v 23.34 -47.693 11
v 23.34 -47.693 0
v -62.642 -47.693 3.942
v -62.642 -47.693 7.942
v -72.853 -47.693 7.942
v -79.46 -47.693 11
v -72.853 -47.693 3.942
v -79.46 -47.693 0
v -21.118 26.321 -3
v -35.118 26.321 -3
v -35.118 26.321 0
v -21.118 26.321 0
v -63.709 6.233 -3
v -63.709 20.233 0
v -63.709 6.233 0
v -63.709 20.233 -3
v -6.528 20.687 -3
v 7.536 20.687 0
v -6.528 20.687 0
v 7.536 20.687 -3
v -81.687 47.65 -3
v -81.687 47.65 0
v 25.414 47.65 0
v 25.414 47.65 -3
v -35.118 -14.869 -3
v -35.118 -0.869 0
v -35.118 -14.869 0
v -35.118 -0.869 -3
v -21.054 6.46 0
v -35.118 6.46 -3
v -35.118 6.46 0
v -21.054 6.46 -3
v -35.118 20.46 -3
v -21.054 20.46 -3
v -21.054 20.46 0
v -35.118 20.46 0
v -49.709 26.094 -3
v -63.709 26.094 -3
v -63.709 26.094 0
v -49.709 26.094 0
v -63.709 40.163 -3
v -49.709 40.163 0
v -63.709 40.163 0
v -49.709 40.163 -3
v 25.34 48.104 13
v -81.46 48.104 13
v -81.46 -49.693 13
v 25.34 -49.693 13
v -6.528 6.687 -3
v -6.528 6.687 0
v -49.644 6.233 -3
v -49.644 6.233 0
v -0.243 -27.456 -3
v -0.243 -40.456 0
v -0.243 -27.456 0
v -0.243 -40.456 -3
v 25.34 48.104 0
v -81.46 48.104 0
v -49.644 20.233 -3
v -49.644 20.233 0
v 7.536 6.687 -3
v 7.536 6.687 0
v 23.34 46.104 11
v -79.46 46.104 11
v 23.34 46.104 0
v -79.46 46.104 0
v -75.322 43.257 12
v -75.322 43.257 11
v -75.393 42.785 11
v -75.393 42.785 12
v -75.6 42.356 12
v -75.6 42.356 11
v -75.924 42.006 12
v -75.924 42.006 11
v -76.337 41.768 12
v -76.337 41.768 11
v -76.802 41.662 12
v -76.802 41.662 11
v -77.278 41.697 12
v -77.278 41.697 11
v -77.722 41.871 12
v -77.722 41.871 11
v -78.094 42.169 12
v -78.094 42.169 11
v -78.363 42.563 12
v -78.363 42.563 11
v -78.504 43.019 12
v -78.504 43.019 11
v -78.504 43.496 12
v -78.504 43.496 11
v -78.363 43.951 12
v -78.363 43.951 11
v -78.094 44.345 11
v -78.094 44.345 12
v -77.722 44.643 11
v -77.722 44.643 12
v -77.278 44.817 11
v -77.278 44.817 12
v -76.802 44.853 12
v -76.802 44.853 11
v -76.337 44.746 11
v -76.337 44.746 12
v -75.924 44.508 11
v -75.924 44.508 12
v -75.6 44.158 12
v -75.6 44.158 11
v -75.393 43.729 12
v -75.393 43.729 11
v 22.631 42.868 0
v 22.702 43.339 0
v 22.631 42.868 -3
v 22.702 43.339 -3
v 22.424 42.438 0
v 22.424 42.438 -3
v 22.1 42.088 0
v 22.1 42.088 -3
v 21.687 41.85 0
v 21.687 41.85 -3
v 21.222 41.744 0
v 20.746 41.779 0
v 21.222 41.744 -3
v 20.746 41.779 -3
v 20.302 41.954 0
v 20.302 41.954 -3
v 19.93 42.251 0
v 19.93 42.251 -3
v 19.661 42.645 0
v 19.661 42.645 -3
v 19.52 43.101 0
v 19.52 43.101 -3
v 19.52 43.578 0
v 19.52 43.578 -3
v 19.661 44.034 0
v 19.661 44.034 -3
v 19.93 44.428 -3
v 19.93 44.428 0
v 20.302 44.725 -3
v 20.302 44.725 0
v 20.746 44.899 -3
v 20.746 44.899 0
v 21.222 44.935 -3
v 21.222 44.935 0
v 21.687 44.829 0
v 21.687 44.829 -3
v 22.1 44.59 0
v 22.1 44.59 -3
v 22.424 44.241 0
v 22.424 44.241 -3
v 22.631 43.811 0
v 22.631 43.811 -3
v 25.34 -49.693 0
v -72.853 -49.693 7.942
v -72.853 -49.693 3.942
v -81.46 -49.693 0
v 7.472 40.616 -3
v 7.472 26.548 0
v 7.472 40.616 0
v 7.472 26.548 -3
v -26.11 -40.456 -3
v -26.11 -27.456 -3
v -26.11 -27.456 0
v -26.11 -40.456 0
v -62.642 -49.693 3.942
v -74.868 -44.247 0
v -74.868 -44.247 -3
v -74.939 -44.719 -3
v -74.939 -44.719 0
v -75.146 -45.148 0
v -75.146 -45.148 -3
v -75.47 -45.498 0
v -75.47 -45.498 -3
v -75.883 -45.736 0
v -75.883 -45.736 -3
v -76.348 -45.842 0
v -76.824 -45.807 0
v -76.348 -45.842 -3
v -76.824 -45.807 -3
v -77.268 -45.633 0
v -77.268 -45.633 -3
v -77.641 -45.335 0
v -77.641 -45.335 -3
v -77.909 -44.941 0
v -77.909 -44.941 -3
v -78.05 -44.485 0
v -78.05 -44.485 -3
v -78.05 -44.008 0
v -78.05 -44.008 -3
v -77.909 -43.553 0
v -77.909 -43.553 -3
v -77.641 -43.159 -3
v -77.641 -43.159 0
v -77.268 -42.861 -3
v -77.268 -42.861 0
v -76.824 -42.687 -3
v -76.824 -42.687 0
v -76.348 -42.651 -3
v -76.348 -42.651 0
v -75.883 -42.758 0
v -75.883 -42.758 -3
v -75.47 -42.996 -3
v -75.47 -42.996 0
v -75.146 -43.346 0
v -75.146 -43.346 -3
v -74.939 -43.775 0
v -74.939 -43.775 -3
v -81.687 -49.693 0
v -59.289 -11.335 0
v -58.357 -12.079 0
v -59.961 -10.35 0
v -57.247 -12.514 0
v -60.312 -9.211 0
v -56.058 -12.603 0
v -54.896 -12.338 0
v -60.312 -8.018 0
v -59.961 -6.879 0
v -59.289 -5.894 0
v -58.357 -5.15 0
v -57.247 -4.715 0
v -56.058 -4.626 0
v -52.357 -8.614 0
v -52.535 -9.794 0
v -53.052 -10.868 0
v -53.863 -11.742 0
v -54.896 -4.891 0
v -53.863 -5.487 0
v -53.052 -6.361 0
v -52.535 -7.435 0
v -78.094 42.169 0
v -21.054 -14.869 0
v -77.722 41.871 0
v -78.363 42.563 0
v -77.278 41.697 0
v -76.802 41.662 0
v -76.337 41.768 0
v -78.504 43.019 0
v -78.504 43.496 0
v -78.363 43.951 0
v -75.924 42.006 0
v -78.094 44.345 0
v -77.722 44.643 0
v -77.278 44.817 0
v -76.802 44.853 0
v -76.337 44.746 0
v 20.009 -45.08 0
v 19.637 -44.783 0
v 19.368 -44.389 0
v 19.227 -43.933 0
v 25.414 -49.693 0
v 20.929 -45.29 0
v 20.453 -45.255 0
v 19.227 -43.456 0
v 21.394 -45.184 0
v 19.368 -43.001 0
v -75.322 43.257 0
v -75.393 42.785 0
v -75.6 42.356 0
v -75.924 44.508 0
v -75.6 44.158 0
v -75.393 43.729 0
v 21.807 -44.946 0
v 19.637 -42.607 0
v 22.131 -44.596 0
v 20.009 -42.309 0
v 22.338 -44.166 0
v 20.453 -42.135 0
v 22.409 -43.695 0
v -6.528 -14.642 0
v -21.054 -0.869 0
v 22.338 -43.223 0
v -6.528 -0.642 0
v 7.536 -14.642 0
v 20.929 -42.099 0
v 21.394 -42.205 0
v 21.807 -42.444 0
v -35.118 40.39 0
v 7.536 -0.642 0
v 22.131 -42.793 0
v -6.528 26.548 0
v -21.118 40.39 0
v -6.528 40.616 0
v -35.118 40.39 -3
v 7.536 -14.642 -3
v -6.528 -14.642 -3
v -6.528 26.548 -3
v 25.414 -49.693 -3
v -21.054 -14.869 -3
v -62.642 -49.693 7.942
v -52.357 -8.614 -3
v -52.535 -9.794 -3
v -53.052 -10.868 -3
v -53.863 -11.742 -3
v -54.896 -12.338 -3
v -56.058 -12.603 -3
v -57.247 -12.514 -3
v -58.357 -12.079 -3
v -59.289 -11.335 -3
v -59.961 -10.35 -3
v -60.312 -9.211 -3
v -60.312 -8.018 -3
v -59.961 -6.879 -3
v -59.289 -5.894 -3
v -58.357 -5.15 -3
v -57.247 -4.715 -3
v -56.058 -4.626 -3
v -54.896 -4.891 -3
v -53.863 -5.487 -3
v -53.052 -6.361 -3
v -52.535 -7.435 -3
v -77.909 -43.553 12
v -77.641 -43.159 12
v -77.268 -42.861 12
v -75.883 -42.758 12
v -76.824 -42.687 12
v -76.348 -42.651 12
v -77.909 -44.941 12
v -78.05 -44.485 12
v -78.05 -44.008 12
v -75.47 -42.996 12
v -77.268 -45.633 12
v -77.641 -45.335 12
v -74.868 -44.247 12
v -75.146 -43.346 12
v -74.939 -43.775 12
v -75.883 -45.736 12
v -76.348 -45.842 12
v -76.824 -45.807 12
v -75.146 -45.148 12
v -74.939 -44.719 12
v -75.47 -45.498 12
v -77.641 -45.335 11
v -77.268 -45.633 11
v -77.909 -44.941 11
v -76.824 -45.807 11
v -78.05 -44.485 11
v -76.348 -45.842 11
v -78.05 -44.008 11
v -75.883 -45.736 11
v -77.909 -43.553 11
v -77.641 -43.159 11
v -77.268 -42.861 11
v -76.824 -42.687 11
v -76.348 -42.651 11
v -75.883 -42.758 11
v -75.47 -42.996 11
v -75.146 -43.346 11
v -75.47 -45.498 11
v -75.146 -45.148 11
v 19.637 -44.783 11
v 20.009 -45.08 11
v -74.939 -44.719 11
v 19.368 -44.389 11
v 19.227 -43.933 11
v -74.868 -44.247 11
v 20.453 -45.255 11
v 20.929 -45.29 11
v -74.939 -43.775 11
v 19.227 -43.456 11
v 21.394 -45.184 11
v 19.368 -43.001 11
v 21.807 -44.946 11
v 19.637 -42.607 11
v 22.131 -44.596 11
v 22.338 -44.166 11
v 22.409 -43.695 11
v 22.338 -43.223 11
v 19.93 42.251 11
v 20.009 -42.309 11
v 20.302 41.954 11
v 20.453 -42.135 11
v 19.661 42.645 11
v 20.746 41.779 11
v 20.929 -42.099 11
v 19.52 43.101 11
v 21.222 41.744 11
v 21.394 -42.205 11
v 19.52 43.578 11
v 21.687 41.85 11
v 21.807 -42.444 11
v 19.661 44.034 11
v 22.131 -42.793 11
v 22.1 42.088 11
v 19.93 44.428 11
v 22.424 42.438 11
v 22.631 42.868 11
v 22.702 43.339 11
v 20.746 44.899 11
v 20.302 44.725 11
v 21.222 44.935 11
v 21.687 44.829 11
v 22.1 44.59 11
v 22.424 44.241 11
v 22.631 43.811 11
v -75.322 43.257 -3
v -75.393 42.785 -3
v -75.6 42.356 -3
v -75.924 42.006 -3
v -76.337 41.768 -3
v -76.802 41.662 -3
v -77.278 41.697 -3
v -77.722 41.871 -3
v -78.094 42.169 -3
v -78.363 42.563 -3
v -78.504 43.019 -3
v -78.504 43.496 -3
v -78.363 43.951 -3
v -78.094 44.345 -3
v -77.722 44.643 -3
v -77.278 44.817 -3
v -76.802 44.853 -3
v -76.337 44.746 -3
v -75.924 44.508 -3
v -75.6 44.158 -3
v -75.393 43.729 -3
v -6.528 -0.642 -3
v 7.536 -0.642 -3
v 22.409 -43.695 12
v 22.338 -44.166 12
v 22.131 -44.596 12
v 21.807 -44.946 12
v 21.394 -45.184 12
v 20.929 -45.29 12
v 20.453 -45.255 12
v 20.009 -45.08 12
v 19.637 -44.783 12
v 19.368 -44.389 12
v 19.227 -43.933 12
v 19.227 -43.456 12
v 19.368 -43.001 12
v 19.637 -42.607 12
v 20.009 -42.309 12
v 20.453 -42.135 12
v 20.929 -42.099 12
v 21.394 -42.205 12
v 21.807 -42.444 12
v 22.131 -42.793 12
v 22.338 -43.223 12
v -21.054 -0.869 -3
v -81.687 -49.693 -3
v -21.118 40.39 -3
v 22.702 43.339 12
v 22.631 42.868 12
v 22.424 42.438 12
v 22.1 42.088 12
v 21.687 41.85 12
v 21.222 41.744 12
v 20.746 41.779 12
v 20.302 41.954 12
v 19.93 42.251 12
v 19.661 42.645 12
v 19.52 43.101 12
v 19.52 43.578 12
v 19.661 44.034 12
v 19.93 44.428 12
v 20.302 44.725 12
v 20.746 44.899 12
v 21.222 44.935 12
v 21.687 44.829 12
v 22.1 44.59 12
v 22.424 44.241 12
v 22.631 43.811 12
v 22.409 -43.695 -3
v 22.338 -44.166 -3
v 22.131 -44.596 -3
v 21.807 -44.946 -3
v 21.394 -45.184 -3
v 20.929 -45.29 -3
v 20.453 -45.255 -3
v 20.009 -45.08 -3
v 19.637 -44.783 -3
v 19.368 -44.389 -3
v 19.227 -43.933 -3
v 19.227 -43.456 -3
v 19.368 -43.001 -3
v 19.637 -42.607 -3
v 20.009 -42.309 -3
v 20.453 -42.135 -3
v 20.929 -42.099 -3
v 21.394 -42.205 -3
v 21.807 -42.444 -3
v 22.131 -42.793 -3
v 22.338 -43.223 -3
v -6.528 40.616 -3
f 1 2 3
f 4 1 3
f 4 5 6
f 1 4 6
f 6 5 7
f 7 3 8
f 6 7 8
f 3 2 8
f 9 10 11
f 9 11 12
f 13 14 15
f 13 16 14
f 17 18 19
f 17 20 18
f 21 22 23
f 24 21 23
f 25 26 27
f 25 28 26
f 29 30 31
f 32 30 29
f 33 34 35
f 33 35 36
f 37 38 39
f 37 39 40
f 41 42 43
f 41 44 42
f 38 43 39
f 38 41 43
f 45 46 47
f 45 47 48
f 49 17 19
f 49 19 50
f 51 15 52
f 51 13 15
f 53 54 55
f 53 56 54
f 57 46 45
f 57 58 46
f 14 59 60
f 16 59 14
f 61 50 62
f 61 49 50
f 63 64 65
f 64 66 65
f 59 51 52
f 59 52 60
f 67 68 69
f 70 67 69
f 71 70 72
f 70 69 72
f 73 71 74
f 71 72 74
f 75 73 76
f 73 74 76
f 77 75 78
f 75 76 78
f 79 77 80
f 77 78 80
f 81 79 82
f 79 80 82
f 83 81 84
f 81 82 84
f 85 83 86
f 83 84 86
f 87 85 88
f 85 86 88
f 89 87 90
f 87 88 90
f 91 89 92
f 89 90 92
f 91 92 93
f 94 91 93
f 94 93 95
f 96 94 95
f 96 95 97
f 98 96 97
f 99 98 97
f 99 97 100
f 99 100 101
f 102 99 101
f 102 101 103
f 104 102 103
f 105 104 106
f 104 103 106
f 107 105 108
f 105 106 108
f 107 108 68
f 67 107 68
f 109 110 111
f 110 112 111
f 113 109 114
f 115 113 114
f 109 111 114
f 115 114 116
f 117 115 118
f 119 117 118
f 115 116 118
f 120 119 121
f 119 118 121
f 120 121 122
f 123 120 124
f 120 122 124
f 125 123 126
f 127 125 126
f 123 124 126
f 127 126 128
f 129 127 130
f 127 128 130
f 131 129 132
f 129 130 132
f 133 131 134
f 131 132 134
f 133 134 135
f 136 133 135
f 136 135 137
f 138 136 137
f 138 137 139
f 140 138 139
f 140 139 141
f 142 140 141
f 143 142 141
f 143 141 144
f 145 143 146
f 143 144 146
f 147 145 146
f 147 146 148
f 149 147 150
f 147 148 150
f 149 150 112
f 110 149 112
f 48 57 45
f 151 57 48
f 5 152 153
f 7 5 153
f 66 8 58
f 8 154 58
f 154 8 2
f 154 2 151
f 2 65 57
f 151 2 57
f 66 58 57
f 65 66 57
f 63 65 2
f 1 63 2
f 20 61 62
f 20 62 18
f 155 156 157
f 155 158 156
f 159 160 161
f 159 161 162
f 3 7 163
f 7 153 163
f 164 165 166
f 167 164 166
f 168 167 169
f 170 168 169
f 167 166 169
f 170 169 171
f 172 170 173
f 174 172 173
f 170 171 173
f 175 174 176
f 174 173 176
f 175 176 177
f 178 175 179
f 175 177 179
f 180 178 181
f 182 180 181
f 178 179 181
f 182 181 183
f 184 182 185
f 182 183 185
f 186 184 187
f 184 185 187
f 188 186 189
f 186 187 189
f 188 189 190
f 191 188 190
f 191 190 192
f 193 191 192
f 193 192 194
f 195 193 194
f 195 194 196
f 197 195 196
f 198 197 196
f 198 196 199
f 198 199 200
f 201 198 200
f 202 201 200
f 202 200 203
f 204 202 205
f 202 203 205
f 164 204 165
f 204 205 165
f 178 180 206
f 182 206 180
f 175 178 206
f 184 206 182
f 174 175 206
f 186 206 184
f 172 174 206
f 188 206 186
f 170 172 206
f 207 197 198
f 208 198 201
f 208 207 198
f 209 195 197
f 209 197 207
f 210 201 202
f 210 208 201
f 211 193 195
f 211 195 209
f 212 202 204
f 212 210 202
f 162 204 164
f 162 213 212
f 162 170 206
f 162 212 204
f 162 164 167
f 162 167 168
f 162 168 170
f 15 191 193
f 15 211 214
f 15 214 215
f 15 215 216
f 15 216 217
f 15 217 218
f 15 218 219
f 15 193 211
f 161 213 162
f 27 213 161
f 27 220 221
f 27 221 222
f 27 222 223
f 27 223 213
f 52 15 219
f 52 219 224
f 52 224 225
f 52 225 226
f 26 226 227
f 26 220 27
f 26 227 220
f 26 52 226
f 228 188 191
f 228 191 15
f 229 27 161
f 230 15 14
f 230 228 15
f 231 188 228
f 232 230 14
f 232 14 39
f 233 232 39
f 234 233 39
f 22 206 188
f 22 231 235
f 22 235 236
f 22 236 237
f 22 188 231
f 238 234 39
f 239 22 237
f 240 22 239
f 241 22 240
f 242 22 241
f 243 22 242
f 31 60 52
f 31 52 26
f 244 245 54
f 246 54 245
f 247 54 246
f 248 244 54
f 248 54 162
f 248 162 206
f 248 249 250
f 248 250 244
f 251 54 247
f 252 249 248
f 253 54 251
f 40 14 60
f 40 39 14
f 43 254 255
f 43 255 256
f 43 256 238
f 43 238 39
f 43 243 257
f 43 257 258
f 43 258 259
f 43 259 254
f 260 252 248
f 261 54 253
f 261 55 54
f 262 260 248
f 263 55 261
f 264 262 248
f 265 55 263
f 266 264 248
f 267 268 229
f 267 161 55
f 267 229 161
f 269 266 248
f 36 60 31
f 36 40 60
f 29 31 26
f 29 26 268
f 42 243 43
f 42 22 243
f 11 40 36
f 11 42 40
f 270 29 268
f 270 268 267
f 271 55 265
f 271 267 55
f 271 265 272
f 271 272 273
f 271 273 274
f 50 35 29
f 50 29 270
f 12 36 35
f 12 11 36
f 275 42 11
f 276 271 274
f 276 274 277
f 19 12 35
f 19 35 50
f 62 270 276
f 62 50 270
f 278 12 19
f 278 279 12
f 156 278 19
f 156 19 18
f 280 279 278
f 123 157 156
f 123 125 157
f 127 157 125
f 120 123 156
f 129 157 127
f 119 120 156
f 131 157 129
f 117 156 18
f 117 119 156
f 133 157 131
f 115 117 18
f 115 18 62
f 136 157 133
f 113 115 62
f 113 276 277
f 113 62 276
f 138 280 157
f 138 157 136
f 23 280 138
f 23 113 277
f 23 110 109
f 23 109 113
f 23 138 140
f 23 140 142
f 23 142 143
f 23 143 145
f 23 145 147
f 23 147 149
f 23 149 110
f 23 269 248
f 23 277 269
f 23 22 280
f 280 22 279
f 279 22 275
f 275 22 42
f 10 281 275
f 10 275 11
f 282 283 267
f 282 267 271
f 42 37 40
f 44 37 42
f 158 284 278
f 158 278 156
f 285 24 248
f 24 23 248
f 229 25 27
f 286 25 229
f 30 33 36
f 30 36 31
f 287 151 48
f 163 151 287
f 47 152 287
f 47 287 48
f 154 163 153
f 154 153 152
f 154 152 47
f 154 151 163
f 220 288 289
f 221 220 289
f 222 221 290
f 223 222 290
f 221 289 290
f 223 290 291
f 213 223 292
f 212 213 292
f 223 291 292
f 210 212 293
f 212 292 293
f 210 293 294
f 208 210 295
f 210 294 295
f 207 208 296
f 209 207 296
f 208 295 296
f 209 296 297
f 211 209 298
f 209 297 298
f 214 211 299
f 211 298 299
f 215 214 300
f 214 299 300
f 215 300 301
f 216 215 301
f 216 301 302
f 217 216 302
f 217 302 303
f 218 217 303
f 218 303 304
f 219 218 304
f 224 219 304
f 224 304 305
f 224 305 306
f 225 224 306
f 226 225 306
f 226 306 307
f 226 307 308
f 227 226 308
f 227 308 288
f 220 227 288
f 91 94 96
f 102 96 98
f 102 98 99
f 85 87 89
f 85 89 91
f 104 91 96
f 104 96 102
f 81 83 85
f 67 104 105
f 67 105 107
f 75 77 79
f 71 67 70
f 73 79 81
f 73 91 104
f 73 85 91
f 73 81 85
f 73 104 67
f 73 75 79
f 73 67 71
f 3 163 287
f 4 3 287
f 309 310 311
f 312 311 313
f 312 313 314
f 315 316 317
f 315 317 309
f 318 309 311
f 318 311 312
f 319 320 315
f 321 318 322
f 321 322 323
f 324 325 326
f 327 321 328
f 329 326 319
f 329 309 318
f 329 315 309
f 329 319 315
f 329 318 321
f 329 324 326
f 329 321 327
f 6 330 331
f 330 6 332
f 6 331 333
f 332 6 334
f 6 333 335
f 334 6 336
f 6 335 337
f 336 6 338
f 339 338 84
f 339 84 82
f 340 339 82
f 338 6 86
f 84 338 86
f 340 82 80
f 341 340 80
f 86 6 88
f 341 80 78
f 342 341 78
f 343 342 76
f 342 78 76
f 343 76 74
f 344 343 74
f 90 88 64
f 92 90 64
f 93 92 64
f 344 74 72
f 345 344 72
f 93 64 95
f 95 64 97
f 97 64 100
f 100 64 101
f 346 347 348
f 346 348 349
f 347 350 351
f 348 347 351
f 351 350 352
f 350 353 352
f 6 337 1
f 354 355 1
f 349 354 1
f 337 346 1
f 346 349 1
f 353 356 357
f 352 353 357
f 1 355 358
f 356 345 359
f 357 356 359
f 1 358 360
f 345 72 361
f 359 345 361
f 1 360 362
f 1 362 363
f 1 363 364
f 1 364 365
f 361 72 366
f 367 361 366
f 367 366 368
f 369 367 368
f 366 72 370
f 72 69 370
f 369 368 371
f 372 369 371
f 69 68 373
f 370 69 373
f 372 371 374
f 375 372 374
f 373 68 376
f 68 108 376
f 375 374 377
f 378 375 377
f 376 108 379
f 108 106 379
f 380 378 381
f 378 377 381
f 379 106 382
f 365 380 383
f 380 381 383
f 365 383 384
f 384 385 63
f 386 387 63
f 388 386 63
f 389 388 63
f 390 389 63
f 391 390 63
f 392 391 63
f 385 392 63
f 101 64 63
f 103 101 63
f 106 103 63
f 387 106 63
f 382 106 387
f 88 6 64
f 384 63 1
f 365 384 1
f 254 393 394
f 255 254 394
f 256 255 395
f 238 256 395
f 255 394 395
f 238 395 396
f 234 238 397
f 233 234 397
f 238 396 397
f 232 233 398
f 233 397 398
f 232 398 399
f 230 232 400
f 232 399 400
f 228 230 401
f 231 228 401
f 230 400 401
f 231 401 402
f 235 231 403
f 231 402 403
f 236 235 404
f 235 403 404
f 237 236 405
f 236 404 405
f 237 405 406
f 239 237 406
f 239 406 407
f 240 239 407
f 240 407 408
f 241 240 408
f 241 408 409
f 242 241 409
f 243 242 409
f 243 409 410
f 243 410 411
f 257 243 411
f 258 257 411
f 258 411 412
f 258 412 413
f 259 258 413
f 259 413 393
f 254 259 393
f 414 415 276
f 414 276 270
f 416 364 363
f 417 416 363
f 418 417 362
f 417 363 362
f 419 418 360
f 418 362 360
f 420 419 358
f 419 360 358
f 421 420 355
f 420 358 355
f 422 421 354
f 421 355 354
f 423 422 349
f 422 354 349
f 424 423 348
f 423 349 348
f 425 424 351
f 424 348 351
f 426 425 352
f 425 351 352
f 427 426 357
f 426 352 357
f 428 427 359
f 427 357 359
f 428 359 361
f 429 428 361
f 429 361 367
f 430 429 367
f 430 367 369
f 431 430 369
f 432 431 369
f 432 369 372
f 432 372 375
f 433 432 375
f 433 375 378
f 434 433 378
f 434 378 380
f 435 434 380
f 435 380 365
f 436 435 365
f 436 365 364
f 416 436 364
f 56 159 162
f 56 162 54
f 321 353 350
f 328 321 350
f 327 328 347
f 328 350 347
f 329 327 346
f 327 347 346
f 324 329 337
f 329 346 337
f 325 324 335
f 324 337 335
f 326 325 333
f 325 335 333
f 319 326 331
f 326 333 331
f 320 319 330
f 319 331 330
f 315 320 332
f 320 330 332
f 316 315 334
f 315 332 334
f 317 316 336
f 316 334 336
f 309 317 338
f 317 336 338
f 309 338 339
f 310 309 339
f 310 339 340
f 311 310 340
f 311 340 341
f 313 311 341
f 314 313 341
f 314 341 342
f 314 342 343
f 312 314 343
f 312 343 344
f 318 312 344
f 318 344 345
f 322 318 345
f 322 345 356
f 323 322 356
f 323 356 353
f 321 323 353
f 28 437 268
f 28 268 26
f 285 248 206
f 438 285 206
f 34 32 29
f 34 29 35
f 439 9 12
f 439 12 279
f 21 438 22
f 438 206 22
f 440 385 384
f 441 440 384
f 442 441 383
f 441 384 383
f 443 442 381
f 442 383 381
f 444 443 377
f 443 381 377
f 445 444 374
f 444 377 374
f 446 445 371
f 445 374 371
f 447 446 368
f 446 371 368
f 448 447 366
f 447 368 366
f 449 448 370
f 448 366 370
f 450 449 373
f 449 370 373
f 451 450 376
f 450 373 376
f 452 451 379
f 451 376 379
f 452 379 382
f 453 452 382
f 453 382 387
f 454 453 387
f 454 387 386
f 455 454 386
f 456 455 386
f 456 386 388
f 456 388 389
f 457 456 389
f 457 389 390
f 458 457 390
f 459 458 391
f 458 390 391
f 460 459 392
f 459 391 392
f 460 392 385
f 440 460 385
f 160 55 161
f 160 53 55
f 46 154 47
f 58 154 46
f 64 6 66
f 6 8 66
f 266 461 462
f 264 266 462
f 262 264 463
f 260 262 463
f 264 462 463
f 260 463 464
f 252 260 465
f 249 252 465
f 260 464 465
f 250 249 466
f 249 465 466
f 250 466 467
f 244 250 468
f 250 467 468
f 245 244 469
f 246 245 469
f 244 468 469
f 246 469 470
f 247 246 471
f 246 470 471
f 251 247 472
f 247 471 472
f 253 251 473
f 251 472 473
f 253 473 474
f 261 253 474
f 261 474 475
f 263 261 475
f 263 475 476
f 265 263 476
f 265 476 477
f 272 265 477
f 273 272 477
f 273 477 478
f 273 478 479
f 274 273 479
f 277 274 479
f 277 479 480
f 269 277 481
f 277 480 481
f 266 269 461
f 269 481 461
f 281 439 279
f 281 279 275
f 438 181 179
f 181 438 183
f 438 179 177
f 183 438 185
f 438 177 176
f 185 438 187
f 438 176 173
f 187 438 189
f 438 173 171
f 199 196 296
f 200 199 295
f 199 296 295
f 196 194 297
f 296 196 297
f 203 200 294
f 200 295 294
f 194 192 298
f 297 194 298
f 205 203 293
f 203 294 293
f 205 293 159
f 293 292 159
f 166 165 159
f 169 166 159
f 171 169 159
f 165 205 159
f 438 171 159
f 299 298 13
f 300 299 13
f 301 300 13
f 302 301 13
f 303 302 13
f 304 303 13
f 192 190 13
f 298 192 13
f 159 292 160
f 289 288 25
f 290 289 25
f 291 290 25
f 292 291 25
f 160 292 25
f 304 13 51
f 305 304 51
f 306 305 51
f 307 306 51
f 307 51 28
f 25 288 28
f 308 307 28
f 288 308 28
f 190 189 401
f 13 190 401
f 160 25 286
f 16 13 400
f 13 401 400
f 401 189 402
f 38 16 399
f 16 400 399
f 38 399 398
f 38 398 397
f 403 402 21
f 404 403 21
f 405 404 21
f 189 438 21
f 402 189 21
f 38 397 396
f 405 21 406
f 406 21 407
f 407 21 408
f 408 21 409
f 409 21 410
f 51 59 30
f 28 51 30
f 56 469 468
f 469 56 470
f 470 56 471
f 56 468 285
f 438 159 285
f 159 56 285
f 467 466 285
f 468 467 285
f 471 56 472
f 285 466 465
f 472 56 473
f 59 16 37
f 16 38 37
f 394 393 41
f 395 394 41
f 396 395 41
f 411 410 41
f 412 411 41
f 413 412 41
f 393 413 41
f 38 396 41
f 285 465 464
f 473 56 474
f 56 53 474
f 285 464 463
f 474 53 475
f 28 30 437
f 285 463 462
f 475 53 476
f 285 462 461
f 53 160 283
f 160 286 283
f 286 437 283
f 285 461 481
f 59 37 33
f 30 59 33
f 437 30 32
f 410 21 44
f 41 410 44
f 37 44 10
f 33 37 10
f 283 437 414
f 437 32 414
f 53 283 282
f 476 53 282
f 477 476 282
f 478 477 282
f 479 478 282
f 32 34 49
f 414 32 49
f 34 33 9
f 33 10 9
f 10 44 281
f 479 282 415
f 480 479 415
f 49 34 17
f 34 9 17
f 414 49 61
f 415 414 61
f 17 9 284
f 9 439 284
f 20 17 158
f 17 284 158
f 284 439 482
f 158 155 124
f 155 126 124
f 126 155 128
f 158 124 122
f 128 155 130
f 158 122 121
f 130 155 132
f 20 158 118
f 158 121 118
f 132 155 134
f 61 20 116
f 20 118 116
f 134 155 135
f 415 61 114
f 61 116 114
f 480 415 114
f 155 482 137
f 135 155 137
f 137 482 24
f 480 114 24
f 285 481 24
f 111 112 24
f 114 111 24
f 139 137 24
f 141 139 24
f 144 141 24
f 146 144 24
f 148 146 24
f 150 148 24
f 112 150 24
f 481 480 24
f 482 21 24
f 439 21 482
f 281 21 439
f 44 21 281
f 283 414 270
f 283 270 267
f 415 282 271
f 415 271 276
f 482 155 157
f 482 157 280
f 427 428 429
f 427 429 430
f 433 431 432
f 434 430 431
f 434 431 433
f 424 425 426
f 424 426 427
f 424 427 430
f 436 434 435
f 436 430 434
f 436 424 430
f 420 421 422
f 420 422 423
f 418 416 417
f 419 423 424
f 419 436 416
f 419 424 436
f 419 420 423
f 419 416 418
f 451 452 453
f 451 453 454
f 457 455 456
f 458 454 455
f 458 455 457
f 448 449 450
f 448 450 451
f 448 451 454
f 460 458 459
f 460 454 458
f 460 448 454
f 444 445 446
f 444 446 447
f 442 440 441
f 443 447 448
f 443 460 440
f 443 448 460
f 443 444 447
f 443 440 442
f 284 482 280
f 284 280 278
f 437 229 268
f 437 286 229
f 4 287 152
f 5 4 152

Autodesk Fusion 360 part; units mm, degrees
sketch "Sketch1" plane through (0, 0, 0) normal (0, 0, 1) x (1, 0, 0)
  line L0 (-81.4597, 48.1043) -> (25.3403, 48.1043)
  line L1 (25.3403, 48.1043) -> (25.3403, -49.6927)
  line L2 (25.3403, -49.6927) -> (-81.4597, -49.6927)
  line L3 (-81.4597, -49.6927) -> (-81.4597, 48.1043)
  dimension "d1" = 106.8
extrude "Extrude1" add sketch "Sketch1" along normal blind 13 makes body 1
shell "Shell1" thickness 2 removed faces 1 at (-45.8597, 15.5053, 0) on bodies 1
sketch "Sketch2" plane through (0, 0, 0) normal (0, 0, 1) x (1, 0, 0)
  line L0 (-81.6866, 47.6505) -> (25.4136, 47.6505)
  line L1 (25.4136, 47.6505) -> (25.4136, -49.6927)
  line L2 (25.4136, -49.6927) -> (-81.6866, -49.6927)
  line L3 (-81.6866, -49.6927) -> (-81.6866, 47.6505)
extrude "Extrude2" add sketch "Sketch2" against normal blind 3 separate body makes body 2
sketch "Sketch3" plane through (0, 0, -3) normal (0, 0, -1) x (1, 0, 0)
  line L0 (25.4136, 49.6927) -> (-81.6866, 49.6927)
  line L1 (-81.6866, 49.6927) -> (-81.6866, -47.6505)
  line L2 (-81.6866, -47.6505) -> (25.4136, -47.6505)
  line L3 (25.4136, -47.6505) -> (25.4136, 49.6927)
  line L4 (7.4719, -40.6164) -> (-6.5281, -40.6164)
  line L5 (-6.5281, -40.6164) -> (-6.5281, -26.5481)
  line L6 (-6.5281, -26.5481) -> (7.4719, -26.5481)
  line L7 (7.4719, -26.5481) -> (7.4719, -40.6164)
  line L8 (7.5365, -20.6868) -> (-6.5281, -20.6868)
  line L9 (-6.5281, -20.6868) -> (-6.5281, -6.6868)
  line L10 (-6.5281, -6.6868) -> (7.5365, -6.6868)
  line L11 (7.5365, -6.6868) -> (7.5365, -20.6868)
  line L12 (7.5365, 0.6425) -> (-6.5281, 0.6425)
  line L13 (-6.5281, 0.6425) -> (-6.5281, 14.6425)
  line L14 (-6.5281, 14.6425) -> (7.5365, 14.6425)
  line L15 (7.5365, 14.6425) -> (7.5365, 0.6425)
  line L16 (-21.1185, -40.3895) -> (-35.1185, -40.3895)
  line L17 (-21.0538, 14.8694) -> (-21.0538, 0.8694)
  line L18 (-35.1185, -20.4599) -> (-35.1185, -6.4599)
  line L19 (-21.1185, -26.3212) -> (-21.1185, -40.3895)
  line L20 (-35.1185, 14.8694) -> (-21.0538, 14.8694)
  line L21 (-21.0538, -20.4599) -> (-35.1185, -20.4599)
  line L22 (-21.0538, 0.8694) -> (-35.1185, 0.8694)
  line L23 (-21.0538, -6.4599) -> (-21.0538, -20.4599)
  line L24 (-35.1185, -26.3212) -> (-21.1185, -26.3212)
  line L25 (-35.1185, -6.4599) -> (-21.0538, -6.4599)
  line L26 (-35.1185, 0.8694) -> (-35.1185, 14.8694)
  line L27 (-35.1185, -40.3895) -> (-35.1185, -26.3212)
  line L28 (7.4719, -40.6164) -> (-6.5281, -40.6164)
  line L29 (7.5365, 14.6425) -> (7.5365, 0.6425)
  line L30 (-6.5281, -20.6868) -> (-6.5281, -6.6868)
  line L31 (7.4719, -26.5481) -> (7.4719, -40.6164)
  line L32 (-6.5281, 14.6425) -> (7.5365, 14.6425)
  line L33 (7.5365, -20.6868) -> (-6.5281, -20.6868)
  line L34 (7.5365, 0.6425) -> (-6.5281, 0.6425)
  line L35 (7.5365, -6.6868) -> (7.5365, -20.6868)
  line L36 (-6.5281, -26.5481) -> (7.4719, -26.5481)
  line L37 (-6.5281, -6.6868) -> (7.5365, -6.6868)
  line L38 (-6.5281, 0.6425) -> (-6.5281, 14.6425)
  line L39 (-6.5281, -40.6164) -> (-6.5281, -26.5481)
  line L40 (-49.7088, -40.1626) -> (-63.7088, -40.1626)
  line L41 (-63.7088, -20.233) -> (-63.7088, -6.233)
  line L42 (-49.7088, -26.0943) -> (-49.7088, -40.1626)
  line L43 (-49.6441, -20.233) -> (-63.7088, -20.233)
  line L44 (-49.6441, -6.233) -> (-49.6441, -20.233)
  line L45 (-63.7088, -26.0943) -> (-49.7088, -26.0943)
  line L46 (-63.7088, -6.233) -> (-49.6441, -6.233)
  line L47 (-63.7088, -40.1626) -> (-63.7088, -26.0943)
  dimension "d7" = 14
  dimension "d8" = 14
  dimension "d9" = 14
  dimension "d10" = 14
  dimension "d11" = 14
  dimension "d12" = 14
  dimension "d13" = 14
  dimension "d14" = 14
  dimension "d15" = 14
  dimension "d16" = 14
  dimension "d17" = 14
sketch "Sketch4" plane through (0, 0, -3) normal (0, 0, -1) x (1, 0, 0)
  circle A0 centre (-56.3569, 8.6145) radius 4
  dimension "d19" = 8
extrude "Extrude3" cut sketch "Sketch3" sketch "Sketch4" against normal blind 5 contours L4 L5 L6 L7 L28 L31 L36 L39 | L8 L9 L10 L11 L30 L33 L35 L37 | L12 L13 L14 L15 L29 L32 L34 L38 | L16 L19 L24 L27 | L17 L20 L22 L26 | L18 L21 L23 L25 | L40 L42 L45 L47 | L41 L43 L44 L46 of sketch 2 bodies 2
sketch "Sketch5" plane through (0, 0, -3) normal (0, 0, -1) x (1, 0, 0)
  line L0 (25.4136, 49.6927) -> (-81.6866, 49.6927)
  line L1 (-81.6866, 49.6927) -> (-81.6866, -47.6505)
  line L2 (-81.6866, -47.6505) -> (25.4136, -47.6505)
  line L3 (25.4136, -47.6505) -> (25.4136, 49.6927)
  circle A0 centre (-56.3569, 8.6145) radius 4
  line L4 (7.5365, -20.6868) -> (-6.5281, -20.6868)
  line L5 (-6.5281, -20.6868) -> (-6.5281, -6.6868)
  line L6 (-6.5281, -6.6868) -> (7.5365, -6.6868)
  line L7 (7.5365, -6.6868) -> (7.5365, -20.6868)
  line L8 (-21.1185, -26.3212) -> (-21.1185, -40.3895)
  line L9 (-21.1185, -40.3895) -> (-35.1185, -40.3895)
  line L10 (-35.1185, -40.3895) -> (-35.1185, -26.3212)
  line L11 (-35.1185, -26.3212) -> (-21.1185, -26.3212)
  line L12 (7.5365, 14.6425) -> (7.5365, 0.6425)
  line L13 (7.5365, 0.6425) -> (-6.5281, 0.6425)
  line L14 (-6.5281, 0.6425) -> (-6.5281, 14.6425)
  line L15 (-6.5281, 14.6425) -> (7.5365, 14.6425)
  line L16 (-49.7088, -26.0943) -> (-49.7088, -40.1626)
  line L17 (-49.7088, -40.1626) -> (-63.7088, -40.1626)
  line L18 (-63.7088, -40.1626) -> (-63.7088, -26.0943)
  line L19 (-63.7088, -26.0943) -> (-49.7088, -26.0943)
  line L20 (-21.0538, 14.8694) -> (-21.0538, 0.8694)
  line L21 (-21.0538, 0.8694) -> (-35.1185, 0.8694)
  line L22 (-35.1185, 0.8694) -> (-35.1185, 14.8694)
  line L23 (-35.1185, 14.8694) -> (-21.0538, 14.8694)
  line L24 (-21.0538, -20.4599) -> (-35.1185, -20.4599)
  line L25 (-35.1185, -20.4599) -> (-35.1185, -6.4599)
  line L26 (-35.1185, -6.4599) -> (-21.0538, -6.4599)
  line L27 (-21.0538, -6.4599) -> (-21.0538, -20.4599)
  line L28 (7.4719, -26.5481) -> (7.4719, -40.6164)
  line L29 (7.4719, -40.6164) -> (-6.5281, -40.6164)
  line L30 (-6.5281, -40.6164) -> (-6.5281, -26.5481)
  line L31 (-6.5281, -26.5481) -> (7.4719, -26.5481)
  line L32 (-49.6441, -20.233) -> (-63.7088, -20.233)
  line L33 (-63.7088, -20.233) -> (-63.7088, -6.233)
  line L34 (-63.7088, -6.233) -> (-49.6441, -6.233)
  line L35 (-49.6441, -6.233) -> (-49.6441, -20.233)
  line L36 (-0.243, 27.4558) -> (-26.1104, 27.4558)
  line L37 (-26.1104, 27.4558) -> (-26.1104, 40.4558)
  line L38 (-26.1104, 40.4558) -> (-0.243, 40.4558)
  line L39 (-0.243, 40.4558) -> (-0.243, 27.4558)
  dimension "d22" = 13
extrude "Extrude4" cut sketch "Sketch5" against normal blind 5 contours L36 L37 L38 L39 bodies 2
sketch "Sketch6" plane through (0, 0, -3) normal (0, 0, -1) x (1, 0, 0)
  line L0 (-49.6441, -20.233) -> (-63.7088, -20.233)
  line L1 (-63.7088, -20.233) -> (-63.7088, -6.233)
  line L2 (-63.7088, -6.233) -> (-49.6441, -6.233)
  line L3 (-49.6441, -6.233) -> (-49.6441, -20.233)
  line L4 (7.4719, -26.5481) -> (7.4719, -40.6164)
  line L5 (7.4719, -40.6164) -> (-6.5281, -40.6164)
  line L6 (-6.5281, -40.6164) -> (-6.5281, -26.5481)
  line L7 (-6.5281, -26.5481) -> (7.4719, -26.5481)
  line L8 (-21.0538, -20.4599) -> (-35.1185, -20.4599)
  line L9 (-35.1185, -20.4599) -> (-35.1185, -6.4599)
  line L10 (-35.1185, -6.4599) -> (-21.0538, -6.4599)
  line L11 (-21.0538, -6.4599) -> (-21.0538, -20.4599)
  line L12 (-21.0538, 14.8694) -> (-21.0538, 0.8694)
  line L13 (-21.0538, 0.8694) -> (-35.1185, 0.8694)
  line L14 (-35.1185, 0.8694) -> (-35.1185, 14.8694)
  line L15 (-35.1185, 14.8694) -> (-21.0538, 14.8694)
  line L16 (-49.7088, -26.0943) -> (-49.7088, -40.1626)
  line L17 (-49.7088, -40.1626) -> (-63.7088, -40.1626)
  line L18 (-63.7088, -40.1626) -> (-63.7088, -26.0943)
  line L19 (-63.7088, -26.0943) -> (-49.7088, -26.0943)
  line L20 (7.5365, 14.6425) -> (7.5365, 0.6425)
  line L21 (7.5365, 0.6425) -> (-6.5281, 0.6425)
  line L22 (-6.5281, 0.6425) -> (-6.5281, 14.6425)
  line L23 (-6.5281, 14.6425) -> (7.5365, 14.6425)
  line L24 (-21.1185, -26.3212) -> (-21.1185, -40.3895)
  line L25 (-21.1185, -40.3895) -> (-35.1185, -40.3895)
  line L26 (-35.1185, -40.3895) -> (-35.1185, -26.3212)
  line L27 (-35.1185, -26.3212) -> (-21.1185, -26.3212)
  line L28 (7.5365, -20.6868) -> (-6.5281, -20.6868)
  line L29 (-6.5281, -20.6868) -> (-6.5281, -6.6868)
  line L30 (-6.5281, -6.6868) -> (7.5365, -6.6868)
  line L31 (7.5365, -6.6868) -> (7.5365, -20.6868)
  circle A0 centre (-56.3569, 8.6145) radius 4
  line L32 (25.4136, 49.6927) -> (-81.6866, 49.6927)
  line L33 (-81.6866, 49.6927) -> (-81.6866, -47.6505)
  line L34 (-81.6866, -47.6505) -> (25.4136, -47.6505)
  line L35 (25.4136, -47.6505) -> (25.4136, 49.6927)
  line L36 (-26.1104, 27.4558) -> (-26.1104, 40.4558)
  line L37 (-26.1104, 40.4558) -> (-0.243, 40.4558)
  line L38 (-0.243, 40.4558) -> (-0.243, 27.4558)
  line L39 (-0.243, 27.4558) -> (-26.1104, 27.4558)
sketch "Sketch7" plane through (0, 0, -3) normal (0, 0, -1) x (1, 0, 0)
sketch "Sketch8" plane through (0, 0, -3) normal (0, 0, -1) x (1, 0, 0)
sketch "Sketch9" plane through (0, -49.6927, 0) normal (0, -1, 0) x (1, 0, 0)
  line L0 (-81.4597, 0) -> (25.3403, 0)
  line L1 (25.3403, 0) -> (25.3403, 13)
  line L2 (25.3403, 13) -> (-81.4597, 13)
  line L3 (-81.4597, 13) -> (-81.4597, 0)
  line L4 (-62.6425, 7.9418) -> (-72.8533, 7.9418)
  line L5 (-72.8533, 7.9418) -> (-72.8533, 3.9418)
  line L6 (-72.8533, 3.9418) -> (-62.6425, 3.9418)
  line L7 (-62.6425, 3.9418) -> (-62.6425, 7.9418)
  dimension "d26" = 4
extrude "Extrude5" cut sketch "Sketch9" against normal blind 5 contours L4 L5 L6 L7 bodies 1
sketch "Sketch10" plane through (0, 0, -3) normal (0, 0, -1) x (1, 0, 0)
  circle A0 centre (-76.6946, -42.8855) radius 1.6
  circle A1 centre (-76.6946, 44.1487) radius 1.6
  circle A2 centre (20.5825, -42.8855) radius 1.6
  circle A3 centre (20.8094, 43.6948) radius 1.6
  dimension "d29" = 3.2
  dimension "d30" = 3.2
  dimension "d31" = 3.2
  dimension "d32" = 3.2
extrude "Extrude6" cut sketch "Sketch10" against normal blind 15 contours A3 bodies 1 2
sketch "Sketch11" plane through (0, 0, -3) normal (0, 0, -1) x (1, 0, 0)
  circle A0 centre (-76.9216, -43.2571) radius 1.6
  point P0 (-76.9216, -43.2571)
  point P1 (-76.9216, 44.9276)
  point P2 (21.2632, -43.0302)
  dimension "d35" = 3.2
extrude "Extrude7" cut sketch "Sketch11" against normal blind 15 bodies 1 2
sketch "Sketch12" plane through (0, 0, -3) normal (0, 0, -1) x (1, 0, 0)
  circle A0 centre (21.1024, -43.3393) radius 1.6
  dimension "d38" = 3.2
extrude "Extrude8" cut sketch "Sketch12" against normal blind 15 bodies 1 2
sketch "Sketch13" plane through (0, 0, -3) normal (0, 0, -1) x (1, 0, 0)
  circle A0 centre (-76.4677, 44.2469) radius 1.6
  dimension "d41" = 3.2
extrude "Extrude9" cut sketch "Sketch13" against normal blind 15 bodies 1 2
